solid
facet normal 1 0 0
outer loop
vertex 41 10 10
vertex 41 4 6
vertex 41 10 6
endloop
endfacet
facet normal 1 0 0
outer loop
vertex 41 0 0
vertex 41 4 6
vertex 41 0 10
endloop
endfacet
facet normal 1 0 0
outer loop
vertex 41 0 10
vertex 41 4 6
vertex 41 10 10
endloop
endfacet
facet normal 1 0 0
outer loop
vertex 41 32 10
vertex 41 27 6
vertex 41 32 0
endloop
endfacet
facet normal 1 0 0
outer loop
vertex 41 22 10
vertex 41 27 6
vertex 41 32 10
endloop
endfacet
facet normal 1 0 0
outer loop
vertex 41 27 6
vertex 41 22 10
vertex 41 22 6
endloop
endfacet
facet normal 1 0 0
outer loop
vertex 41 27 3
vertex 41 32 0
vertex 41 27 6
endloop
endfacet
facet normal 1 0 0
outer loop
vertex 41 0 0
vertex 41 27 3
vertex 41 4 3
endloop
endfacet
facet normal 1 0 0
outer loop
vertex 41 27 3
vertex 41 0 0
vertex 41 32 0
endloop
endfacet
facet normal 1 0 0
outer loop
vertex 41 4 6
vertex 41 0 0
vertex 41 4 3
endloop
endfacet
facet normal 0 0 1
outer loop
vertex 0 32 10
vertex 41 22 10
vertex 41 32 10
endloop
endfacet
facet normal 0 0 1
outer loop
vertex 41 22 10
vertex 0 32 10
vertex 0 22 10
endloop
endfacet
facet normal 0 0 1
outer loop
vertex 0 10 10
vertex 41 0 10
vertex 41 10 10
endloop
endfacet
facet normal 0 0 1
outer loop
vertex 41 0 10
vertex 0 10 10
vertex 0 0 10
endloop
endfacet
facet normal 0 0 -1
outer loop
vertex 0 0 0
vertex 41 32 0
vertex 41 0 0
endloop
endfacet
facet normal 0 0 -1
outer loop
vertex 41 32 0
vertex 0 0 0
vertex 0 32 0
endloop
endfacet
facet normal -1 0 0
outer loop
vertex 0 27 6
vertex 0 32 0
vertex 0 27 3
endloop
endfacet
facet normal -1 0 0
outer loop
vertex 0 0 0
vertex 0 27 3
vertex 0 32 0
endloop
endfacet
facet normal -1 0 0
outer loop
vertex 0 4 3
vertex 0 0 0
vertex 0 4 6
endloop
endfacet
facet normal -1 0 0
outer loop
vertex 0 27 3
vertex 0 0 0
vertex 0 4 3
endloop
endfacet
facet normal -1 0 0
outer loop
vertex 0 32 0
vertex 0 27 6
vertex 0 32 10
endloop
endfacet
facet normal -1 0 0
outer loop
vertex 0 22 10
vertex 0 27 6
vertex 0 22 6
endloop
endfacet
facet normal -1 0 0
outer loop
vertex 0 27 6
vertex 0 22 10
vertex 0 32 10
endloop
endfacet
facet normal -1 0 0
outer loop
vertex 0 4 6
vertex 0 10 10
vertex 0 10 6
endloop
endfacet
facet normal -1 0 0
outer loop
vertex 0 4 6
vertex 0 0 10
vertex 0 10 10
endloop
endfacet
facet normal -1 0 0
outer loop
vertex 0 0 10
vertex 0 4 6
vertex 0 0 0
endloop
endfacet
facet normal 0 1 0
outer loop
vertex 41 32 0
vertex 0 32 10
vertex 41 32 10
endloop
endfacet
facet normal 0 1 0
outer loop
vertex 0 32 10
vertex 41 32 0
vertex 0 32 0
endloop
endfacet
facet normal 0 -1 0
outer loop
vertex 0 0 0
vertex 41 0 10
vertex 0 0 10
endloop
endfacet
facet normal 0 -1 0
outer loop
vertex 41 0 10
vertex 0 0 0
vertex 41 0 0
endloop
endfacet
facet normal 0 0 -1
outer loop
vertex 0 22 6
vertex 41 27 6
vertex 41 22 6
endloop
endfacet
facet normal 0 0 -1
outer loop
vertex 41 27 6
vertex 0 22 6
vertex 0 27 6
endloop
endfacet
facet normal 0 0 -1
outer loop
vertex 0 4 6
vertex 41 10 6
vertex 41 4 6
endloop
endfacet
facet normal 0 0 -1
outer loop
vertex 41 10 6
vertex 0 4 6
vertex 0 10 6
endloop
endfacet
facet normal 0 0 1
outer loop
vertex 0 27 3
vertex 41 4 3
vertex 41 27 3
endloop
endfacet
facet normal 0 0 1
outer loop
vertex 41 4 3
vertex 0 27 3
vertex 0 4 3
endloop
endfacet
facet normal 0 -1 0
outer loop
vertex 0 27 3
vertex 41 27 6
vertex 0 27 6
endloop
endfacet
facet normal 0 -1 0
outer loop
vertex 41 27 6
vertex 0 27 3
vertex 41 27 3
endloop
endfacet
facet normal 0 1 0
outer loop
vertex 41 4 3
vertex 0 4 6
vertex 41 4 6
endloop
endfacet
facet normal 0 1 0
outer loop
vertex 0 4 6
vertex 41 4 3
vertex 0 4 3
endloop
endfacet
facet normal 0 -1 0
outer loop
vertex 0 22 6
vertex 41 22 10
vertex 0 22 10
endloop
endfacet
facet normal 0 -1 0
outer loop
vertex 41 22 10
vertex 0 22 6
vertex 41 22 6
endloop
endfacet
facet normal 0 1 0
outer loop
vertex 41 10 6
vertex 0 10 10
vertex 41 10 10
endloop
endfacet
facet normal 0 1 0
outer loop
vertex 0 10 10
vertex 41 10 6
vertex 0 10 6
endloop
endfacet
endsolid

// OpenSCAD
difference()
{
    cube([41,32,10]);
    translate([-4,4,3]) cube([50,23,3]);
    translate([-4,10,3]) cube([50,12,10]);
}
